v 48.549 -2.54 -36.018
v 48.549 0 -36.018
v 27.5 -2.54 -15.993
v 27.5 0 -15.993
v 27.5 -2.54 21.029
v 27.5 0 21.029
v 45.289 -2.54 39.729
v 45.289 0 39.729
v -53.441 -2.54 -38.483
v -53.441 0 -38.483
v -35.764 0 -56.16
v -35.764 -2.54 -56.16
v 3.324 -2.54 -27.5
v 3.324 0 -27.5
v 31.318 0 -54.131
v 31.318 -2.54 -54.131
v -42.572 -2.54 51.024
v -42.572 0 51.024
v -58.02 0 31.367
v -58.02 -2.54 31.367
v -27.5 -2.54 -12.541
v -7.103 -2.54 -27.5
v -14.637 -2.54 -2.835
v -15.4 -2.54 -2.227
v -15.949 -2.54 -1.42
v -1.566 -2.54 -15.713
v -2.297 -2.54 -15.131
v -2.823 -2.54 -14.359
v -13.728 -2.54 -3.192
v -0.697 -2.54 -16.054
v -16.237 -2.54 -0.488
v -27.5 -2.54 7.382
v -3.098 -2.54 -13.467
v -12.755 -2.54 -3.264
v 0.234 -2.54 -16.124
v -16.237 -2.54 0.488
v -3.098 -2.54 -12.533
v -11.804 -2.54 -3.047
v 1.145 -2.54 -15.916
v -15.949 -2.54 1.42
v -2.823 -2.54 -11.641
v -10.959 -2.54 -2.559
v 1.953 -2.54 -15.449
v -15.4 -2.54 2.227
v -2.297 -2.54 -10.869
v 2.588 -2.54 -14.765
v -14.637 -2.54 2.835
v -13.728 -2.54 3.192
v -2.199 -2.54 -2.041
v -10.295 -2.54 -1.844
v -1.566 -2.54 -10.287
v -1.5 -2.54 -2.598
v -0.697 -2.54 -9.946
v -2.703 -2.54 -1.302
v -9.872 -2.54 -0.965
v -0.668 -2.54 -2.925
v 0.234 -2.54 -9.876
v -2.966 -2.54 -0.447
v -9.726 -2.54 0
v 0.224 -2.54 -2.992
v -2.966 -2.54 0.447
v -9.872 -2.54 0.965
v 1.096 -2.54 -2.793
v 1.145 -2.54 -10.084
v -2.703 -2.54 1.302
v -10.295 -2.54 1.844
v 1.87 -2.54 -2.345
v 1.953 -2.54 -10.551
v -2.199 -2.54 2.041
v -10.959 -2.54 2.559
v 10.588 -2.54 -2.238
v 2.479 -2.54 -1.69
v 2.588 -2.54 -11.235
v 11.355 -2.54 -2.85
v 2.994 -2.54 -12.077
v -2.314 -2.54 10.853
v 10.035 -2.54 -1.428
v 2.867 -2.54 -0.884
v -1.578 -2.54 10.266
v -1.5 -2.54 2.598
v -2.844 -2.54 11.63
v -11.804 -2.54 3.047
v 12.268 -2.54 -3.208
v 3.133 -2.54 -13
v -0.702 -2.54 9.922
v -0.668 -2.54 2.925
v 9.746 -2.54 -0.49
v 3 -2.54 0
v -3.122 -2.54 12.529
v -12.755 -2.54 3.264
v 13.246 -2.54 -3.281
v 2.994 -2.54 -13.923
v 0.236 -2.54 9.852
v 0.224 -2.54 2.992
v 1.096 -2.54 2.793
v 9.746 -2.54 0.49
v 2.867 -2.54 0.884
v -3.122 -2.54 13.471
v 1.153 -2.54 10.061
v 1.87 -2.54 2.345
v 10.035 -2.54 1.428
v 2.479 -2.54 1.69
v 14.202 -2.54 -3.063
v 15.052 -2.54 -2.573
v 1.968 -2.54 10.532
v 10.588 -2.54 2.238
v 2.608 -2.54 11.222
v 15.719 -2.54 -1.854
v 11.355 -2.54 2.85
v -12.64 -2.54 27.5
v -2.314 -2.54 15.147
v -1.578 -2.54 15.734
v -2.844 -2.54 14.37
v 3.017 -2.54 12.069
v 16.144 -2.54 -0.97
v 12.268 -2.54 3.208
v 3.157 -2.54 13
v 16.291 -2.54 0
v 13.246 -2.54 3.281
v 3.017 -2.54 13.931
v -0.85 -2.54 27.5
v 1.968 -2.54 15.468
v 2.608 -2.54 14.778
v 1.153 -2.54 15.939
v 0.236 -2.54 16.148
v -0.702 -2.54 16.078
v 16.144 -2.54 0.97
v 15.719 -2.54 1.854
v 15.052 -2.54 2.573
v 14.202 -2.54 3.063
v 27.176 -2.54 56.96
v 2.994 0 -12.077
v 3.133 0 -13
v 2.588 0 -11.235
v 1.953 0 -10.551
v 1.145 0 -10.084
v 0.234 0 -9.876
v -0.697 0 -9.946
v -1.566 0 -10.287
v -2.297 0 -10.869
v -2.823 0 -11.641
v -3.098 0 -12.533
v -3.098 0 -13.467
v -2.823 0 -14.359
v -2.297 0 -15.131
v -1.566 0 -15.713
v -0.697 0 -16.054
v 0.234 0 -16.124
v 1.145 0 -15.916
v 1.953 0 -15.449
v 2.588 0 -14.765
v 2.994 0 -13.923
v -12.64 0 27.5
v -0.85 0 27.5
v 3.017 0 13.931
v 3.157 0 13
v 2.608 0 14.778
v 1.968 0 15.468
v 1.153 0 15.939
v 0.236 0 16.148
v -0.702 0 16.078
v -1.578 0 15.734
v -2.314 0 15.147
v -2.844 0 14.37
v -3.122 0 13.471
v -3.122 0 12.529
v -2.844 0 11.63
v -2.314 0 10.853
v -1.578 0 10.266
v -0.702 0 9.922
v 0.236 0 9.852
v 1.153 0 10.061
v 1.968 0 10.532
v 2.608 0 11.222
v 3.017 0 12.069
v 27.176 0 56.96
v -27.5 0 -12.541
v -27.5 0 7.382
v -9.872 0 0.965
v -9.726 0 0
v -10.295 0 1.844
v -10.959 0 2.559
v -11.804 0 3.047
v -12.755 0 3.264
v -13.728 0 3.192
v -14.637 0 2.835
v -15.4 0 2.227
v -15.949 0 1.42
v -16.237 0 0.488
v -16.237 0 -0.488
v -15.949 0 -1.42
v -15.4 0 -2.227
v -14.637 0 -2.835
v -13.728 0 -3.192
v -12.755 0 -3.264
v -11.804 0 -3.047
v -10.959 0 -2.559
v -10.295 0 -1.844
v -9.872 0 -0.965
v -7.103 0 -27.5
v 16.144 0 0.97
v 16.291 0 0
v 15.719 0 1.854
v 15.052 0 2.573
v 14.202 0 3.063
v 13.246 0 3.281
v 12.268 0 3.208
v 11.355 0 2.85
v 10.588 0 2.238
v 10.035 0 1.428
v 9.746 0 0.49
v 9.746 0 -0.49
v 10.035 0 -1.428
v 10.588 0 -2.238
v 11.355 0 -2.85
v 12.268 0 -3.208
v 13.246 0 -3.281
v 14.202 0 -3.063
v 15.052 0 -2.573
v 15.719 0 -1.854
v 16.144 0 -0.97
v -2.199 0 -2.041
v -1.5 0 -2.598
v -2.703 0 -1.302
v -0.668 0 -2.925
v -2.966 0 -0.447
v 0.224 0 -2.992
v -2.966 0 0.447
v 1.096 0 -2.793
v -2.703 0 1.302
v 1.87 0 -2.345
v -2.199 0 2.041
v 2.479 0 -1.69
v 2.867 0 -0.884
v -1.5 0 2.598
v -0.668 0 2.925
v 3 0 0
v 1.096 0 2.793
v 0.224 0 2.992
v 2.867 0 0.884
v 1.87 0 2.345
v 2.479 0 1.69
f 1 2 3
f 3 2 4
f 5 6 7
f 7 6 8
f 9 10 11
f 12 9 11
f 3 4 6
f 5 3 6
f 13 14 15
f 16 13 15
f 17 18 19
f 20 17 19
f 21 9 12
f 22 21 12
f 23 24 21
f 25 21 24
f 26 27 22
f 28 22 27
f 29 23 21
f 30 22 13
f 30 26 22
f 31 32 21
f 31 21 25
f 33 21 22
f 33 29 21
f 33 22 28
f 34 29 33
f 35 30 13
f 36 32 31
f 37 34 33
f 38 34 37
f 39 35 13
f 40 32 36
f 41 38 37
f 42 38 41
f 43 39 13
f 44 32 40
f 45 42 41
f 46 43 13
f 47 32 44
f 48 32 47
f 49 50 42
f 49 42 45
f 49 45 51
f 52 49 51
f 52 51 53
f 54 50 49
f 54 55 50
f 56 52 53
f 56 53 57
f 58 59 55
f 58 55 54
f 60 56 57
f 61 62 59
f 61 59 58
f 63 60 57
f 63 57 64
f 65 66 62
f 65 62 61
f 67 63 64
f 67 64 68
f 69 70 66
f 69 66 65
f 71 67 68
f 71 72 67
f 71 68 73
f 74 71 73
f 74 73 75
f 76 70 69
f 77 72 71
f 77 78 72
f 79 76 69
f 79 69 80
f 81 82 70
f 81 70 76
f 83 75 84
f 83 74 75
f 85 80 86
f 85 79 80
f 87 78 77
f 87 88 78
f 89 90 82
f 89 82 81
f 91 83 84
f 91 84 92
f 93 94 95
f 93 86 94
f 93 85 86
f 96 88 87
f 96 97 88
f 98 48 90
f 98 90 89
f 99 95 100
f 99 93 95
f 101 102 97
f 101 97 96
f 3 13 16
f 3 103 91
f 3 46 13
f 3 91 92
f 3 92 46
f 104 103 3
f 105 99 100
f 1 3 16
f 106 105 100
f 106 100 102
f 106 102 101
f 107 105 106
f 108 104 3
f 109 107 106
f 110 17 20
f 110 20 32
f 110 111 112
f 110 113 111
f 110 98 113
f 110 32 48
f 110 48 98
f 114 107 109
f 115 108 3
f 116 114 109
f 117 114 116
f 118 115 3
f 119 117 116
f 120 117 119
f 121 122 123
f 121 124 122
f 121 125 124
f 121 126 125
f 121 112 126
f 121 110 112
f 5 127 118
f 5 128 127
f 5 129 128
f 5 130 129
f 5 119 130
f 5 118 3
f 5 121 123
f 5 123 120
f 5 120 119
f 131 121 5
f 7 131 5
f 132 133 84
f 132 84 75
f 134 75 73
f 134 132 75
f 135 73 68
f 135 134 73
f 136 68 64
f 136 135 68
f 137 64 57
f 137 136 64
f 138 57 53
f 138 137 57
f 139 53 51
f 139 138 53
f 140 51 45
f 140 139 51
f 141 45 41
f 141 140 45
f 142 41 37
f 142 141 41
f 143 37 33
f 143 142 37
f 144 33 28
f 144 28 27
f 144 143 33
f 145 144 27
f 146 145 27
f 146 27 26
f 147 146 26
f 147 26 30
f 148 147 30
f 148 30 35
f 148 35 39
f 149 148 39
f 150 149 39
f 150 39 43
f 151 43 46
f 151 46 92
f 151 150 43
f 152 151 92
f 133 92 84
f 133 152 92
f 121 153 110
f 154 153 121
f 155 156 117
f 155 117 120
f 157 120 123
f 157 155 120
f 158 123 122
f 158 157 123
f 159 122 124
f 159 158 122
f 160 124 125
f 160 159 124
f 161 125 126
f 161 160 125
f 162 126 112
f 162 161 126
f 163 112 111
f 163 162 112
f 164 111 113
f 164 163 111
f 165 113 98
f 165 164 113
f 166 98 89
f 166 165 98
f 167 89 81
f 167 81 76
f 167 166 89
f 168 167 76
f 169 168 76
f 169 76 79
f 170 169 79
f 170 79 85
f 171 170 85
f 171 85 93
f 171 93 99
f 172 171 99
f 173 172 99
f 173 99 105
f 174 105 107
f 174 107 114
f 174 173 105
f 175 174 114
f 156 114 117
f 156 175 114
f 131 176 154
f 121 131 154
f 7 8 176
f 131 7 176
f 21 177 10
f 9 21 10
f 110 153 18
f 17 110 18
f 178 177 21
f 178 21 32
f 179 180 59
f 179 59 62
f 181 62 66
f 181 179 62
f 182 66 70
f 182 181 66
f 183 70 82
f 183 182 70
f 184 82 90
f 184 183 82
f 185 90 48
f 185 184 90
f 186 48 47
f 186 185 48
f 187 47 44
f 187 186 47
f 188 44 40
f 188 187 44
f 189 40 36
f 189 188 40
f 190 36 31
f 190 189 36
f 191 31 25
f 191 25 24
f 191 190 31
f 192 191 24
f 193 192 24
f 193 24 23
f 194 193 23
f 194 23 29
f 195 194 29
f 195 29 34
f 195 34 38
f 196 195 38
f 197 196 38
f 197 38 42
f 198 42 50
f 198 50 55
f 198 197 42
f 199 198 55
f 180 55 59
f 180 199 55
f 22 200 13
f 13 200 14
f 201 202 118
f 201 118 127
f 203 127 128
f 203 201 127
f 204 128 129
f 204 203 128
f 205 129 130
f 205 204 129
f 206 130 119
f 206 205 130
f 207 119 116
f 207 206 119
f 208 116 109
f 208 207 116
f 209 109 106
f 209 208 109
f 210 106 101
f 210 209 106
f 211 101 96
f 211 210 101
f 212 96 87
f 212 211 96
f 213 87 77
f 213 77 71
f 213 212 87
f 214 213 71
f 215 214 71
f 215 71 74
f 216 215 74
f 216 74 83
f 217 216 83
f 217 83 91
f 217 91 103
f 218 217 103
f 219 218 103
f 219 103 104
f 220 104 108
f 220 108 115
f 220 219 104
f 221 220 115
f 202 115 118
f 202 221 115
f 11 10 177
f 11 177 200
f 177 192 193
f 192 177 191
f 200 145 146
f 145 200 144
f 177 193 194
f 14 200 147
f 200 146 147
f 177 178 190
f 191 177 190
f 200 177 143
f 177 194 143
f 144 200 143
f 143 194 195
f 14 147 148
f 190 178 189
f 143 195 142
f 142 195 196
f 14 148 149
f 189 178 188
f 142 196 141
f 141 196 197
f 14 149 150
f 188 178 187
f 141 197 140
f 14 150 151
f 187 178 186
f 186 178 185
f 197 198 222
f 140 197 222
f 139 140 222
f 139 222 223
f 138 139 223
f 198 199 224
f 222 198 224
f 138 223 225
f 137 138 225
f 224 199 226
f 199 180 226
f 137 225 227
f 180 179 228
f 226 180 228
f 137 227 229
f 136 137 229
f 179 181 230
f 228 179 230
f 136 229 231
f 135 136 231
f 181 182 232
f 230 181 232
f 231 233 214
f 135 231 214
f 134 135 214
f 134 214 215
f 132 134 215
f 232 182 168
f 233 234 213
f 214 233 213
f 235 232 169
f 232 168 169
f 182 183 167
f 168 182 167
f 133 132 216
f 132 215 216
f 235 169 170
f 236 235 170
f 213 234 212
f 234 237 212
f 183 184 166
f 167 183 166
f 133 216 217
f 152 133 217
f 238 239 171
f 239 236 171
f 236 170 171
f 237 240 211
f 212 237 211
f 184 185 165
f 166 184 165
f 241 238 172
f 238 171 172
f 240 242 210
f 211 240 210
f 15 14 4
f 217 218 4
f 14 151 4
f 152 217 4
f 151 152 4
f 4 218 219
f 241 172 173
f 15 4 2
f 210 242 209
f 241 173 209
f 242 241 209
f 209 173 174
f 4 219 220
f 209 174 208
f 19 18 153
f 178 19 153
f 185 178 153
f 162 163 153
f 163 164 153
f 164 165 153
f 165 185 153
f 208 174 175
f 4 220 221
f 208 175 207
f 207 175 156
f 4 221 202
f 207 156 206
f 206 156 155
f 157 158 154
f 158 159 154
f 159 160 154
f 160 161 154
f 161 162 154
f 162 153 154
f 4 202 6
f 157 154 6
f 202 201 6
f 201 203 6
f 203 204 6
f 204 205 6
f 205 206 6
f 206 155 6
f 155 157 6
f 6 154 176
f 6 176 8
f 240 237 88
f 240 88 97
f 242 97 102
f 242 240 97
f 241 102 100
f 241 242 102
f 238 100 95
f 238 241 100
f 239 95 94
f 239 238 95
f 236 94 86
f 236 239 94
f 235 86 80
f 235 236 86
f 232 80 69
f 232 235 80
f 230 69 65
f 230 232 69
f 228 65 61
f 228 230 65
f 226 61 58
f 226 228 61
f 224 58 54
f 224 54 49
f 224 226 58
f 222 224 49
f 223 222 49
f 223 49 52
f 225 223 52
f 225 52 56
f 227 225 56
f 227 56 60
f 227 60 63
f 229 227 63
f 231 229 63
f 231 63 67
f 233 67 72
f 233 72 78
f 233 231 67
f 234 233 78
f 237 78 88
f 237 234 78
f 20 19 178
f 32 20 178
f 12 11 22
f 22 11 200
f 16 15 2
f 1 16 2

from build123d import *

# Parameters (mm, degrees)
F0_W     = 55
F0_H     = 55
F0_R     = 3.132813
F0_R_2   = 3.273598
F0_R_3   = 3
F0_R_4   = 3.290695
F0_R_5   = 3.156981
F1_DEPTH = 2.54
F3_DEPTH = 2.54
F4_DEPTH = 2.54


with BuildPart() as f1:
    # F0 (on Front) → F1 (new body)
    with BuildSketch(Plane.XZ):
        Rectangle(F0_W, F0_H)
        with Locations((0, -13)):
            Circle(F0_R, mode=Mode.SUBTRACT)
        with Locations((-13, 0)):
            Circle(F0_R_2, mode=Mode.SUBTRACT)
        Circle(F0_R_3, mode=Mode.SUBTRACT)
        with Locations((13, 0)):
            Circle(F0_R_4, mode=Mode.SUBTRACT)
        with Locations((0, 13)):
            Circle(F0_R_5, mode=Mode.SUBTRACT)
    extrude(amount=F1_DEPTH)

    # F2 (on Front) → F3 (join)
    with BuildSketch(Plane.XZ):
        Polygon((27.176162, 56.960059), (-2.272366, 26.004693), (-2.272366, 25.895225), (15.78599, 8.715909), (45.289185, 39.728738), align=None)
    extrude(amount=F3_DEPTH)

    # F2 (on Front) → F4 (join)
    with BuildSketch(Plane.XZ):
        Polygon((-5.332045, -25.728772), (-23.22517, -8.266557), (-53.441247, -38.482634), (-35.763578, -56.160304), align=None)
        Polygon((19.693311, -8.566808), (2.620379, -26.830509), (31.317548, -54.130764), (48.548869, -36.017741), align=None)
        Polygon((-26.064494, 6.253897), (-10.96375, 26.182832), (-42.571661, 51.02363), (-58.019511, 31.367487), align=None)
    extrude(amount=F4_DEPTH)


solid = f1.part
